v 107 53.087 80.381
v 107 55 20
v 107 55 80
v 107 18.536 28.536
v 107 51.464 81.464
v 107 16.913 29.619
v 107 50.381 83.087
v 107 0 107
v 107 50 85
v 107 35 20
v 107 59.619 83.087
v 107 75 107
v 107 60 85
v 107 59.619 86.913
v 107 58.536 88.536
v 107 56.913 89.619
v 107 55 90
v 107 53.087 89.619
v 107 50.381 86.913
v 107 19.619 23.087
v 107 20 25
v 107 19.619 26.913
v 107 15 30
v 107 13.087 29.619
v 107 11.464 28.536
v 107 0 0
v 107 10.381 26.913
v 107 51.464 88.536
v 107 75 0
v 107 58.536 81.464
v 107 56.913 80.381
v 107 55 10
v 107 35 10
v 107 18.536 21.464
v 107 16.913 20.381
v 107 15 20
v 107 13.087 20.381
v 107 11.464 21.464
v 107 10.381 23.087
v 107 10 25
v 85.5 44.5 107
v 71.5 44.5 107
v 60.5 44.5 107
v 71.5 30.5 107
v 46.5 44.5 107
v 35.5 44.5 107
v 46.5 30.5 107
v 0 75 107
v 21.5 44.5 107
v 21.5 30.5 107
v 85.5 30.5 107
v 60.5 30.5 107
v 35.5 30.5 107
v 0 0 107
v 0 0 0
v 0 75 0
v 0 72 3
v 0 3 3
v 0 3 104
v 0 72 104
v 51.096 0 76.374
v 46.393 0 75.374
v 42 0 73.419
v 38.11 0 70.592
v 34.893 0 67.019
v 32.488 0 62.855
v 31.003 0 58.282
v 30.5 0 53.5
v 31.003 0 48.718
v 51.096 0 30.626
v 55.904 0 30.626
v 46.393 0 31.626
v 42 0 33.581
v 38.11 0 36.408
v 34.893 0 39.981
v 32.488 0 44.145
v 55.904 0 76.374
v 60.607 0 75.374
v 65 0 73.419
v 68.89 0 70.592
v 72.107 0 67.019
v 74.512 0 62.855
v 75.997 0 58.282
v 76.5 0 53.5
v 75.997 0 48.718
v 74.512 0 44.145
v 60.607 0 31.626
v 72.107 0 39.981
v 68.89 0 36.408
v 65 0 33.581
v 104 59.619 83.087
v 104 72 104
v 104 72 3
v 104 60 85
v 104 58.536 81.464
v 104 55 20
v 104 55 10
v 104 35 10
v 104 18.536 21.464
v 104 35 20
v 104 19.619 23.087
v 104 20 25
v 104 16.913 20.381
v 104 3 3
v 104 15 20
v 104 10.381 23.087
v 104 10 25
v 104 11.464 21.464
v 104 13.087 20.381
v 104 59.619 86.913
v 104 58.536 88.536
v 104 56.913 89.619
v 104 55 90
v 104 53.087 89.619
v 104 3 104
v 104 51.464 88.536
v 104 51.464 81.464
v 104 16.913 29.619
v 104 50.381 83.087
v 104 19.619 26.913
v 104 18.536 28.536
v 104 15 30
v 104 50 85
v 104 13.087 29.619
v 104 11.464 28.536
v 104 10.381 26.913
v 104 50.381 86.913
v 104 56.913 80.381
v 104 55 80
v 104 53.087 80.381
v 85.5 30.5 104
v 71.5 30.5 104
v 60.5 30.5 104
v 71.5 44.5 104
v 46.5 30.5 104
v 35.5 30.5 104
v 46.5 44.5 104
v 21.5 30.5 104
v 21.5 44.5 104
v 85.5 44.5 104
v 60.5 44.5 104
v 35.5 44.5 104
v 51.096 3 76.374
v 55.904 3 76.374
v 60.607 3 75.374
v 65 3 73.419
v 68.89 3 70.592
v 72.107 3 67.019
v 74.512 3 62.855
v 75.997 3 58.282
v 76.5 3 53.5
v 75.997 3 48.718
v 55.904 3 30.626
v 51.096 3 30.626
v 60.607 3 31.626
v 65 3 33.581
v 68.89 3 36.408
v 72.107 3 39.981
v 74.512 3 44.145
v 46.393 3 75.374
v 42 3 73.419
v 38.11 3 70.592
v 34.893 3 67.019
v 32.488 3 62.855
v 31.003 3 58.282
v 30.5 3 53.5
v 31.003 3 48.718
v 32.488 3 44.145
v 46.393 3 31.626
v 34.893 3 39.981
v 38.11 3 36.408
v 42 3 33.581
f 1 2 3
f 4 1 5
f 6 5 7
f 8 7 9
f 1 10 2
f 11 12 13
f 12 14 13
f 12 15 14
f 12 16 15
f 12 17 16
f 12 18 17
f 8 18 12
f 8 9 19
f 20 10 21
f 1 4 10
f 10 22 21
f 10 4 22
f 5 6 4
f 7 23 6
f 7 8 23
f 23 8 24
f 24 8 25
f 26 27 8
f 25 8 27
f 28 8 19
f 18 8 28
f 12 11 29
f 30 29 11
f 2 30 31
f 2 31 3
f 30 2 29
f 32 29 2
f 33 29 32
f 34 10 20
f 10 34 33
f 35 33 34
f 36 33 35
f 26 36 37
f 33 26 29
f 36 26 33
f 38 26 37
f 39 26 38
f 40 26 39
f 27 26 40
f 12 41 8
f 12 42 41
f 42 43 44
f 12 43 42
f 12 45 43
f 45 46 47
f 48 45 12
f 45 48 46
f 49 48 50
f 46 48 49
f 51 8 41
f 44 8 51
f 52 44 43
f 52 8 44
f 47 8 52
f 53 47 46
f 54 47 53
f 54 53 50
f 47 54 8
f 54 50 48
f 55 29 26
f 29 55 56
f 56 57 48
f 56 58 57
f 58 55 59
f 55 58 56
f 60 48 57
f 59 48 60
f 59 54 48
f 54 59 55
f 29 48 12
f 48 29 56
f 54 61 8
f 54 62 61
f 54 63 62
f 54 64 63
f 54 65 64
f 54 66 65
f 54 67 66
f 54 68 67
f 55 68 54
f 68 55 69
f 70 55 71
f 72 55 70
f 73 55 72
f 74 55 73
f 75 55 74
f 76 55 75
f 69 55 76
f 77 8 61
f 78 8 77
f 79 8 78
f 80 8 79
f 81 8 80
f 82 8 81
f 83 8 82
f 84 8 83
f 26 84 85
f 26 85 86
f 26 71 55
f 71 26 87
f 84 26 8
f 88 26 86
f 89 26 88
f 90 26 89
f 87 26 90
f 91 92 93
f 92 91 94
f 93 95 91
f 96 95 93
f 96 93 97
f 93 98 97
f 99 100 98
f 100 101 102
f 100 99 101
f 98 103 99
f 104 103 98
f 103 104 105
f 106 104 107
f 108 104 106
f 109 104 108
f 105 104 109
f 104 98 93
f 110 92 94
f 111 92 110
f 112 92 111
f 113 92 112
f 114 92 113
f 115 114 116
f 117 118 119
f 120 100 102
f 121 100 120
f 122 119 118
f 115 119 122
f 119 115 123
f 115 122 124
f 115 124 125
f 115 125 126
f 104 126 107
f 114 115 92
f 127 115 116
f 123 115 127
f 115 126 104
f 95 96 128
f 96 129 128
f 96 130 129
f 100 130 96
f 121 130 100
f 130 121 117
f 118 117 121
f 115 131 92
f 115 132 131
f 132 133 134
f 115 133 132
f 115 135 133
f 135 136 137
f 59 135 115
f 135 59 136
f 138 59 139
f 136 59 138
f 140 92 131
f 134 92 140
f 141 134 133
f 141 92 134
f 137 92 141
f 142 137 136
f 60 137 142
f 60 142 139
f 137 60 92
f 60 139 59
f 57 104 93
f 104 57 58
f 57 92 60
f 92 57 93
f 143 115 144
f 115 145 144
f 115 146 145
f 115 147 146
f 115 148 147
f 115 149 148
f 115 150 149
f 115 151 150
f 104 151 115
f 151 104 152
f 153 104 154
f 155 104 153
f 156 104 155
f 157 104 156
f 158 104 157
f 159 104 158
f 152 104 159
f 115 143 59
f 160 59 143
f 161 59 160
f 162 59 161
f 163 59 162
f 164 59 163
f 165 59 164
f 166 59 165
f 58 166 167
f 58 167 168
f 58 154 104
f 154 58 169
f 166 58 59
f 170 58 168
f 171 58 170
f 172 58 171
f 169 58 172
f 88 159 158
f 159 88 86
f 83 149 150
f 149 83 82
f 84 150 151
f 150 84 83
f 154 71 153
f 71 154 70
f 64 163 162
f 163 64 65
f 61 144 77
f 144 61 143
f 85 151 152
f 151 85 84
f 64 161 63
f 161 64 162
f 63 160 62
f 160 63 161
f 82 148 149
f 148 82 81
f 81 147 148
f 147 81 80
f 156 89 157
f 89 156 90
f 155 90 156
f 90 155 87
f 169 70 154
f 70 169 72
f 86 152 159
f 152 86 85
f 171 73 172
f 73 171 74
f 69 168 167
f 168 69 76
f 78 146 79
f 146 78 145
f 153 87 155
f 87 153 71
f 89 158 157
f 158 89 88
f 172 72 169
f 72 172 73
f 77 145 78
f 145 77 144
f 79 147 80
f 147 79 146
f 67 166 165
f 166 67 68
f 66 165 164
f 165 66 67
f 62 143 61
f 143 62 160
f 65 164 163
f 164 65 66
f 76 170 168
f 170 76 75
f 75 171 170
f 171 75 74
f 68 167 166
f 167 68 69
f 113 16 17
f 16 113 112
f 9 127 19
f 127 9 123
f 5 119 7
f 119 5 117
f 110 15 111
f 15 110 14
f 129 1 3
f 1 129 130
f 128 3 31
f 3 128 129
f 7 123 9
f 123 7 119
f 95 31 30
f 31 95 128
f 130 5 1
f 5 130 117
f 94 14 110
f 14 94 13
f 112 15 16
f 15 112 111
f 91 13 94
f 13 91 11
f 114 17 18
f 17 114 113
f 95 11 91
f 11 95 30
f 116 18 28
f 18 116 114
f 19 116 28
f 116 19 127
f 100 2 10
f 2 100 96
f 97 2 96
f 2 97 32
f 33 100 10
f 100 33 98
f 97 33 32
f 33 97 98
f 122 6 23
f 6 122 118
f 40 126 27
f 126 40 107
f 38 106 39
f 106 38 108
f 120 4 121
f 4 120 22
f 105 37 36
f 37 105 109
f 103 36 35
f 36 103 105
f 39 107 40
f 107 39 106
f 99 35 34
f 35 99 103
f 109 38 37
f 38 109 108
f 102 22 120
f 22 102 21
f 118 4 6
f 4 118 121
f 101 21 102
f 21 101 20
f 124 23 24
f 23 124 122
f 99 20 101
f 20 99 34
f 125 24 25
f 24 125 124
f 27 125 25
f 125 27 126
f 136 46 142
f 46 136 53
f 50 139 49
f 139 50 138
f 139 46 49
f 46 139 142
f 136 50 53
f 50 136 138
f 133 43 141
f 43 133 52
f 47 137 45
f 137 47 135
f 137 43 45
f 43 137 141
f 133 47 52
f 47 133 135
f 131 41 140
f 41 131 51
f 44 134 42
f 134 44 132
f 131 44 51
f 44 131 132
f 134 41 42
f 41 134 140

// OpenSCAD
difference() {
    // make the cube hollow
    cube([107, 75, 107]);
    translate([3, 3, 3]) {
#        cube([101, 69, 101]);
    }
    // substract the left side (will be printed separetely)
    translate([0, 3, 3]) {
#        cube([3, 69, 101]);
    }
    // speaker
    translate([53.5, 3, 53.5]) {
        rotate([90,0,0]) {
#            cylinder(h = 3, r = 23);
        }
    }
    // volume stick
    translate([104, 55, 85]) {
        rotate([0,90,0]) {
#            cylinder(h = 3, r = 5);
        }
    }
    // Atmel programmer
    translate([107, 35, 10]) {
        rotate([0,0,90]) {
#            cube([20, 3, 10]);
        }
    }
    // power supply
    translate([104, 15, 25]) {
        rotate([0,90,0]) {
#            cylinder(h = 3, r = 5);
        }
    }
        
    // Button 1
    translate([21.5, 30.5, 107]) {
        rotate([0,90,0]) {
#            cube([3, 14, 14]);
        }
    }
    // Button 2
    translate([46.5, 30.5, 107]) {
        rotate([0,90,0]) {
#            cube([3, 14, 14]);
        }
    }
   
    // Button 3
    translate([71.5, 30.5, 107]) {
        rotate([0,90,0]) {
#            cube([3, 14, 14]);
        }
    }      
}
    
